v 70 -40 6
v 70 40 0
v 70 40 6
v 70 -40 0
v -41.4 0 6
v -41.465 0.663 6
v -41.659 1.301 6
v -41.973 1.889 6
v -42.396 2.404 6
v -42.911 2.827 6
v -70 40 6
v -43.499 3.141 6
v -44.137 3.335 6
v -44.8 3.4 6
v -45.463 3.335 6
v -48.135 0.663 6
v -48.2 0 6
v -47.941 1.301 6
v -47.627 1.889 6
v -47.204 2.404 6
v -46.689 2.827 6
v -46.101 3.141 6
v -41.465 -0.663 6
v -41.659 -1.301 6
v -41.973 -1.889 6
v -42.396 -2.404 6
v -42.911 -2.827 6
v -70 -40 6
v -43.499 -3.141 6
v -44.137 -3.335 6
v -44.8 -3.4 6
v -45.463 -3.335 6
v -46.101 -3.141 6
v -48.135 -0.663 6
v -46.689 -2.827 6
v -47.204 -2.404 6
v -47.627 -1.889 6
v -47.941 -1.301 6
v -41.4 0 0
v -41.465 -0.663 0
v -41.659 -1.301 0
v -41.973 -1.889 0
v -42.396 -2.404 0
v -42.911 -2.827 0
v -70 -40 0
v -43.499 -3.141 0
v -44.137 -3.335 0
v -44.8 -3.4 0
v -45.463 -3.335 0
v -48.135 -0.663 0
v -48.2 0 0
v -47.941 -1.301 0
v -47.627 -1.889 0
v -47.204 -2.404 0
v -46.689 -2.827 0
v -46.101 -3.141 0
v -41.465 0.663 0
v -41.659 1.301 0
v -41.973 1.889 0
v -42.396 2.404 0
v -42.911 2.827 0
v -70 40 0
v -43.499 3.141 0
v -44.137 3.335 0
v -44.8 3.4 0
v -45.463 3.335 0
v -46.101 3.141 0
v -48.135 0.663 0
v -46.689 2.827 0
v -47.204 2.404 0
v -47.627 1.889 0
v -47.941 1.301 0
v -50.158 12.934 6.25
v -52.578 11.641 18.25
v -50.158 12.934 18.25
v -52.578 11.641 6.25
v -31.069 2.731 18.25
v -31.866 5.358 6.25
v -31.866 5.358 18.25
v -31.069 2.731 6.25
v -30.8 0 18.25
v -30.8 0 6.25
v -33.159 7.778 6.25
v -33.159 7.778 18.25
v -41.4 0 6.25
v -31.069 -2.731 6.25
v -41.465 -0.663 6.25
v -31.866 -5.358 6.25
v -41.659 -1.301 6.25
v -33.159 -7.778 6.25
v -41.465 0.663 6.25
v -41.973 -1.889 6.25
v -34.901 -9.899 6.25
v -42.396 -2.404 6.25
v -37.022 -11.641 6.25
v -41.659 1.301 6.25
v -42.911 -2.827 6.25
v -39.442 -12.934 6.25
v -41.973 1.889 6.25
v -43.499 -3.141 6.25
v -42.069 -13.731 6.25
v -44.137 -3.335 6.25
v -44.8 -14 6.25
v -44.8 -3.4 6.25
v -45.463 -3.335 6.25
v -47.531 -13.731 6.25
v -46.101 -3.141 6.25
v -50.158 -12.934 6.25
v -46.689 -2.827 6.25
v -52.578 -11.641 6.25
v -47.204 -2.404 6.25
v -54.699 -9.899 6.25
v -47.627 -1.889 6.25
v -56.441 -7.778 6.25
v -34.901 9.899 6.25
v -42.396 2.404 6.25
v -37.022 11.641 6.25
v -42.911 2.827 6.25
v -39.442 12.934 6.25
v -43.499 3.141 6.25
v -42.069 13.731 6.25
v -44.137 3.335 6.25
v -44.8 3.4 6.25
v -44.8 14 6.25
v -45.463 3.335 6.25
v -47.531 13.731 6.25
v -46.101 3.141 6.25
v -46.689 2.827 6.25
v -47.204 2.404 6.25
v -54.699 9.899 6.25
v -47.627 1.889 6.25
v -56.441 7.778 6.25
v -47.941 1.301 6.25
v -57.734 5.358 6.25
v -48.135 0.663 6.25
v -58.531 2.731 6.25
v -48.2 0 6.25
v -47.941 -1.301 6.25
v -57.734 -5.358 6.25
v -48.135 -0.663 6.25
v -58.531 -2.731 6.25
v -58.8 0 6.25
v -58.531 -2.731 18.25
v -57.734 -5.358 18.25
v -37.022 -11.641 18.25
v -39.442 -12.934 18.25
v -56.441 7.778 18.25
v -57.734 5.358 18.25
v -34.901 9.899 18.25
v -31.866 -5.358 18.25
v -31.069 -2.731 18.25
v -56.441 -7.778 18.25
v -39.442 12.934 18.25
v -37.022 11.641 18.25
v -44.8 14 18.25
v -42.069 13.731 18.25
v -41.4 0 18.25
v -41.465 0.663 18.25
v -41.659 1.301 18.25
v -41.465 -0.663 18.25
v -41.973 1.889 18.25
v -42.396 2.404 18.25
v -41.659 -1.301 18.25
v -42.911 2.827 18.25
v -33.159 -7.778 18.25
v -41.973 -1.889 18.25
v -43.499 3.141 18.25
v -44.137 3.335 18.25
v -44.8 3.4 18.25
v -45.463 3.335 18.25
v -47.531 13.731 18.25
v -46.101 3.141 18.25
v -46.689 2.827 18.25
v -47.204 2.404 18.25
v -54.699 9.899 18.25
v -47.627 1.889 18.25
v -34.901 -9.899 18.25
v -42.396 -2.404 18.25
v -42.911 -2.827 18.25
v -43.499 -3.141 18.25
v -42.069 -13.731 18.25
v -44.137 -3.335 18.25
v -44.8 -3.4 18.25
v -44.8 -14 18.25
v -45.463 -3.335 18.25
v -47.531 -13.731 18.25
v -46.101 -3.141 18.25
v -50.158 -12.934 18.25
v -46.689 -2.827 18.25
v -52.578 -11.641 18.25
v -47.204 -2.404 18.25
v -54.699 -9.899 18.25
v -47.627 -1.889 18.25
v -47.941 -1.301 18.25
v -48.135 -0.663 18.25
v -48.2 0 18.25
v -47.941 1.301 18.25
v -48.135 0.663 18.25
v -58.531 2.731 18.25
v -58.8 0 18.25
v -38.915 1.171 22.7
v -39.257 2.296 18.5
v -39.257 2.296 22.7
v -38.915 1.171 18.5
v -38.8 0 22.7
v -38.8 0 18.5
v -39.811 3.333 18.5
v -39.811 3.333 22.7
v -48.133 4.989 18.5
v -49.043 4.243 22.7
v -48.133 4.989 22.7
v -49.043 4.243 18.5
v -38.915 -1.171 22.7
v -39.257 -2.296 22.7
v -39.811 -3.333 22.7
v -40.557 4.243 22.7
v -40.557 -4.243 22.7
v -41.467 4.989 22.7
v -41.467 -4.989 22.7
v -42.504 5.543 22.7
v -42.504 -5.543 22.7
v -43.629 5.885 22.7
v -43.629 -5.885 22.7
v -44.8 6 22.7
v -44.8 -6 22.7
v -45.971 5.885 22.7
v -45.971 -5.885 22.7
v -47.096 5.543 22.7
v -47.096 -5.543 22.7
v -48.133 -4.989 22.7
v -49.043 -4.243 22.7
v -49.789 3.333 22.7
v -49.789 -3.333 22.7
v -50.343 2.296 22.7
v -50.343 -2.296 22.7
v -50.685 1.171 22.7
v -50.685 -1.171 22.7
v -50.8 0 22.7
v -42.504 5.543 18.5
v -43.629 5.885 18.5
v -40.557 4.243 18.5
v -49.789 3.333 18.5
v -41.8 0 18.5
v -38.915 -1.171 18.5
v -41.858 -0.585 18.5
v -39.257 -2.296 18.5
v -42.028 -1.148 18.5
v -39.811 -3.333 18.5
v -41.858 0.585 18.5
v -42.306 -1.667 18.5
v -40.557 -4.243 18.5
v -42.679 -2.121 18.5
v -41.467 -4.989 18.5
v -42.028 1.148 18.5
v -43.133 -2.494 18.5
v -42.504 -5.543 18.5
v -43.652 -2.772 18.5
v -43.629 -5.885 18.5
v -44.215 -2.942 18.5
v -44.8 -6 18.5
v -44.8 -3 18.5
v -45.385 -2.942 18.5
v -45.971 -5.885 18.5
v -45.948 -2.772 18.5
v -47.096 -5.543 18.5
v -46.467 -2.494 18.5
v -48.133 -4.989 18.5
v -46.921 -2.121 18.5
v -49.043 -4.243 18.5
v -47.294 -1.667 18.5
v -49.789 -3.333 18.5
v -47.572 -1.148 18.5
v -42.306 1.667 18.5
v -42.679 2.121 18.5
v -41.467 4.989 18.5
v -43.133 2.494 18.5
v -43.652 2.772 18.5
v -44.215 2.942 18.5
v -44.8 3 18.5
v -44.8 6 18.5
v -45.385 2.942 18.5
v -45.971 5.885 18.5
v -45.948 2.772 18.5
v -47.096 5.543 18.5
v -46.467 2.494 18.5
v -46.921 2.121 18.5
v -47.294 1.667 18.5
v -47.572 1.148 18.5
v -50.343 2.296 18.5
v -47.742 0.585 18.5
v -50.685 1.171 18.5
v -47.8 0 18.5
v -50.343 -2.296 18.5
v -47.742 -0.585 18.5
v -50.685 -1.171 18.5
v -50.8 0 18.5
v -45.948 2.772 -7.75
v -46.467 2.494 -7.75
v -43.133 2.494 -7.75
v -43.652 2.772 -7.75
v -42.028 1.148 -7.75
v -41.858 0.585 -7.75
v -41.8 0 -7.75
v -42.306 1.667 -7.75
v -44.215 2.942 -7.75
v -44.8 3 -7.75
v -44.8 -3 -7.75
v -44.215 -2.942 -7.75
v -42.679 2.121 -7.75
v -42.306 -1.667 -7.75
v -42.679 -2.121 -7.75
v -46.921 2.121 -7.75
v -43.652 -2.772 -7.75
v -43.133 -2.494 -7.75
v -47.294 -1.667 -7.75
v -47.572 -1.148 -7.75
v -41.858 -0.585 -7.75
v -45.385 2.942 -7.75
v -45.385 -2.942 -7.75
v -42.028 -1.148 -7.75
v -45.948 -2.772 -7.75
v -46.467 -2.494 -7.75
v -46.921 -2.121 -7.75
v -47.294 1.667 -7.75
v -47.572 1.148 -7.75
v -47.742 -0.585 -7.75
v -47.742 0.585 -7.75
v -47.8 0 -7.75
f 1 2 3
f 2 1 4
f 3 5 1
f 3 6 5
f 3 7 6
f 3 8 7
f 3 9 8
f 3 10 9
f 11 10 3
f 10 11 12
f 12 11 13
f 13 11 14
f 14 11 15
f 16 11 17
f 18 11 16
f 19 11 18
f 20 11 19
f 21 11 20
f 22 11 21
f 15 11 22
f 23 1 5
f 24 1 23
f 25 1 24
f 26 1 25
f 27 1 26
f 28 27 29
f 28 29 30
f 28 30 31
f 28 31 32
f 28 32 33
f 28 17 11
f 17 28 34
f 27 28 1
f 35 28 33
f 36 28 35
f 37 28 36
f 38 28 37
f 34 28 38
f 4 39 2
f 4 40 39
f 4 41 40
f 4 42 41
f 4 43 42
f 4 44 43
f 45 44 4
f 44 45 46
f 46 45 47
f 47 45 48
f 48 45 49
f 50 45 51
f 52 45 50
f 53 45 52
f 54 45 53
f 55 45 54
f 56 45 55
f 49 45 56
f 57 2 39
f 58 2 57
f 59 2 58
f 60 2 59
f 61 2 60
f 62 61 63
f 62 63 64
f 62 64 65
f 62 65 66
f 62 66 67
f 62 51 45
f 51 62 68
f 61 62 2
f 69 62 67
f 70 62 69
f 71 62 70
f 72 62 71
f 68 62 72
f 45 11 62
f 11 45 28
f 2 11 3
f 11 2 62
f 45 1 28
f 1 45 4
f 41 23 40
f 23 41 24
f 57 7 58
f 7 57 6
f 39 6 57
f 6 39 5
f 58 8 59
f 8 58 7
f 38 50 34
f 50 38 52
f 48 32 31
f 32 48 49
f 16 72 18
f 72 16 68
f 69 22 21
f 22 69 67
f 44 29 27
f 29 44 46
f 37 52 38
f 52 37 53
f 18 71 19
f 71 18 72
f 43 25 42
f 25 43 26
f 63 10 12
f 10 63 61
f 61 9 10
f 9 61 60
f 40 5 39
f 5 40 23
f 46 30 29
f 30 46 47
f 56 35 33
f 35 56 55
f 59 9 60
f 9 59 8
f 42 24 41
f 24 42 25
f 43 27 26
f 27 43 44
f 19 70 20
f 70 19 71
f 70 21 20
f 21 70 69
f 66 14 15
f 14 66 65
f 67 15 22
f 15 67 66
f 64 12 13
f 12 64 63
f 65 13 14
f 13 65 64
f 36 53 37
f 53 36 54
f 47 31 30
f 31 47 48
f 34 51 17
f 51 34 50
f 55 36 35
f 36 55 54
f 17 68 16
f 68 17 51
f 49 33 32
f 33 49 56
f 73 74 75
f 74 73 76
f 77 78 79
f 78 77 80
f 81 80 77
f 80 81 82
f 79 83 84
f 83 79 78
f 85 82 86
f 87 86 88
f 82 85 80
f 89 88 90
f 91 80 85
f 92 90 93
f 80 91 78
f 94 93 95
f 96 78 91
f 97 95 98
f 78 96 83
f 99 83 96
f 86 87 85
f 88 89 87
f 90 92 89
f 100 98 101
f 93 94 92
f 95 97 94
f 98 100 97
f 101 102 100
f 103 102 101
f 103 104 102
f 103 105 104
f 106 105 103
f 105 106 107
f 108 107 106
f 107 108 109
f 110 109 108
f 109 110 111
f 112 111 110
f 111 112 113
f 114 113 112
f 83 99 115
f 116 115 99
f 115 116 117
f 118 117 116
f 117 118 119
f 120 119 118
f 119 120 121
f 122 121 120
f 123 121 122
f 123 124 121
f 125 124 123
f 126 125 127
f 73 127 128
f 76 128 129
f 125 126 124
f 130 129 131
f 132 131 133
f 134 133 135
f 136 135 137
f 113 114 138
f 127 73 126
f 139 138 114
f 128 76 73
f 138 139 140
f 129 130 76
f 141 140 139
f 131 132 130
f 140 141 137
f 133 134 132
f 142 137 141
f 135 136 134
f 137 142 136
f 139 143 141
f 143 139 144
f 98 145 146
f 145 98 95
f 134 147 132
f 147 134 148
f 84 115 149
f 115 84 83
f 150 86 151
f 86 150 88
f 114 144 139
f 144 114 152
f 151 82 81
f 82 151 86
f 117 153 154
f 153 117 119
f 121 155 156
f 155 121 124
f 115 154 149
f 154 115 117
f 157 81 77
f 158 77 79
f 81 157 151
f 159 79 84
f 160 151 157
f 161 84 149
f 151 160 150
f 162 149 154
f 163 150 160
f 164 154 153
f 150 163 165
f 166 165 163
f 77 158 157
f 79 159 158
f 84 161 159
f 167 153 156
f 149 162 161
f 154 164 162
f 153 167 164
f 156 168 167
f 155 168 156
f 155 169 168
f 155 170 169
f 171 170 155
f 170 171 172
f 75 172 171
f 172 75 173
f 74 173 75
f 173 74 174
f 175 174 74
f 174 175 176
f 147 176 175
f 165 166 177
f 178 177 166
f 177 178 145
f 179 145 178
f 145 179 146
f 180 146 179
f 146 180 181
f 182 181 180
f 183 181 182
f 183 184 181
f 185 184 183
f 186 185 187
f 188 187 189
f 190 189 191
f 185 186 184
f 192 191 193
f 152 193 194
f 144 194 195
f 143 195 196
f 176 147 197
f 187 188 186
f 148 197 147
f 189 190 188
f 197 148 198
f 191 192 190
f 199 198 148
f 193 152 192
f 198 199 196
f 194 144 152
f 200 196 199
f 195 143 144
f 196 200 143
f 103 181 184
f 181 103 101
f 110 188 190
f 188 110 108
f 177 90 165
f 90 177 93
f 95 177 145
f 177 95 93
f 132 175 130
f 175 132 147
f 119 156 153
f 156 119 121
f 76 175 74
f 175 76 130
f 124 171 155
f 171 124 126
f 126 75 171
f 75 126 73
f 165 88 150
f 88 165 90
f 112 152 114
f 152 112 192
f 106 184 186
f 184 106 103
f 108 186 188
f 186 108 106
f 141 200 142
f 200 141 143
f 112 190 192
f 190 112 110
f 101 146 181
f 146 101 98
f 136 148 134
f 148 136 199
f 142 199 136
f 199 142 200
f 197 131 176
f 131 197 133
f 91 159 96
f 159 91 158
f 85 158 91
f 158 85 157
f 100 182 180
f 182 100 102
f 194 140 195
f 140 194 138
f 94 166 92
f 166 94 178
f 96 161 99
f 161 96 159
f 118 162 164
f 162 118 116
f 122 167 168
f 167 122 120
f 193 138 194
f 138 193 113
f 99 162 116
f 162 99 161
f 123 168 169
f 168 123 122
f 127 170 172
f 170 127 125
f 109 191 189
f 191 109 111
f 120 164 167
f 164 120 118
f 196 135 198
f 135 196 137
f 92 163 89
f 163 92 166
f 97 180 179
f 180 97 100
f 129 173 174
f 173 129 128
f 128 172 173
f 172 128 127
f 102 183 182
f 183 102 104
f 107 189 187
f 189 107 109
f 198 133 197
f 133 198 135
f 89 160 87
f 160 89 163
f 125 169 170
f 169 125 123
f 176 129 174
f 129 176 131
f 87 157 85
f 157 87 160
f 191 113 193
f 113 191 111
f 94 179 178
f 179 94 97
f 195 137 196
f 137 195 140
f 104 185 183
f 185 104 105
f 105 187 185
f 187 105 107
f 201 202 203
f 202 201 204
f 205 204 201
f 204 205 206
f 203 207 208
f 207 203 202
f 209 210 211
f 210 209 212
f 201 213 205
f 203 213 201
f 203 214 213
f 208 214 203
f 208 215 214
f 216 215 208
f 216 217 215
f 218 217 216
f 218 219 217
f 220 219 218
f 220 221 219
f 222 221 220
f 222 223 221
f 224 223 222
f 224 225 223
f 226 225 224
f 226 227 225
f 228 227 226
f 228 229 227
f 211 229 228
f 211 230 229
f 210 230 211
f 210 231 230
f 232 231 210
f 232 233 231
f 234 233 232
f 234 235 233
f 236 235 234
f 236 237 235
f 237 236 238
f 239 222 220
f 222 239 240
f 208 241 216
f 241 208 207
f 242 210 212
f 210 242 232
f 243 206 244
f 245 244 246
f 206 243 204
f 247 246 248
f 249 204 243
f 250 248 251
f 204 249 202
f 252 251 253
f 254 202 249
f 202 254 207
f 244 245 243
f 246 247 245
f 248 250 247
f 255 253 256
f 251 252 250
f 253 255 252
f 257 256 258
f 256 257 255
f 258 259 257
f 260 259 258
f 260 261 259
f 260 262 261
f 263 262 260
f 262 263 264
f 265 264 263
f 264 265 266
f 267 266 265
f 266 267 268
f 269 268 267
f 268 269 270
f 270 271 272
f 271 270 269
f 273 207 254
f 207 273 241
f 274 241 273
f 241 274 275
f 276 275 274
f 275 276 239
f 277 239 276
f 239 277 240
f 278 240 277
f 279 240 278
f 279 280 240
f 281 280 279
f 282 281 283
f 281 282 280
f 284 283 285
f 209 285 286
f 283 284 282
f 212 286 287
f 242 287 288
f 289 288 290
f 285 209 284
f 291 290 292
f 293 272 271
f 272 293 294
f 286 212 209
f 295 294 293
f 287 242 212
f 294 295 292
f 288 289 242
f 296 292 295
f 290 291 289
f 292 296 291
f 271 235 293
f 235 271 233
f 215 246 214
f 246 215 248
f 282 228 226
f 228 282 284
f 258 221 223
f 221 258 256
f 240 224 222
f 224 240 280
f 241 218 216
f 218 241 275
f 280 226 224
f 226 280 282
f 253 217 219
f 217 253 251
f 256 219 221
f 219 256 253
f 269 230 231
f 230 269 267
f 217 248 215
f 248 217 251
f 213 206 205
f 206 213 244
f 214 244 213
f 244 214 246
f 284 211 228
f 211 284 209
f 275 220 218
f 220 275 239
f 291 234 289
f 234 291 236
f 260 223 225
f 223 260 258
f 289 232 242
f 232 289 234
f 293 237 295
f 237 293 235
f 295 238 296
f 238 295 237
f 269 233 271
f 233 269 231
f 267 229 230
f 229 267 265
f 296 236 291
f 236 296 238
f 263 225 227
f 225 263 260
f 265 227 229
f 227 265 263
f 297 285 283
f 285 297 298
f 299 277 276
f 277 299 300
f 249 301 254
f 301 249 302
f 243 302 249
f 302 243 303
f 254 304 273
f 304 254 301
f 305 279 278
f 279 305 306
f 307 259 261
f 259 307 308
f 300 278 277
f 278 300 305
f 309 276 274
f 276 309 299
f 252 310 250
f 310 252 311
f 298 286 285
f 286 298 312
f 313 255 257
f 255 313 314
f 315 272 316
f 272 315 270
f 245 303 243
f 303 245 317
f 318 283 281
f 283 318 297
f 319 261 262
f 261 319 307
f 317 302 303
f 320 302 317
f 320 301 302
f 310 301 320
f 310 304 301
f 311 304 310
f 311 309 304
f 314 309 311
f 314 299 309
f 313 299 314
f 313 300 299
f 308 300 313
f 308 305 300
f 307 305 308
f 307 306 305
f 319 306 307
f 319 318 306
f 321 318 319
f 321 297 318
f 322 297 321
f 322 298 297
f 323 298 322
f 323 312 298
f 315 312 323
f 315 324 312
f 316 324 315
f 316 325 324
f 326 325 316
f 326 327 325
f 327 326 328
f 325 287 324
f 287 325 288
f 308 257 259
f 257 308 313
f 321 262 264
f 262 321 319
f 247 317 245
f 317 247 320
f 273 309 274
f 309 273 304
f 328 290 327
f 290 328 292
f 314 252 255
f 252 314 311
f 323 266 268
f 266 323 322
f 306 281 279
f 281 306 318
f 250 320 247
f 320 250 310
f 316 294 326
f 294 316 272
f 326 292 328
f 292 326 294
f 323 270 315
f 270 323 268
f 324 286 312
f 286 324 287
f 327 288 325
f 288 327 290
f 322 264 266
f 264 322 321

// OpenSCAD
$fn = 32;

// ------------------------------------------------------------------------
// Standoff columns: 1 d28 standoffs, bolts d6
// Every part is its own module, assembly() places them once.
// ------------------------------------------------------------------------

// --- part 1 ---
module base_plate() {
  difference() {
    translate([-70, -40, 0]) cube([140, 80, 6]);
    translate([-44.8, 0, -1]) cylinder(h = 8, d = 6.8);
  }
}

// --- part 2 ---
module spacer() {
  difference() {
      translate([0, 0, 0]) cylinder(h = 12, d = 28);
      translate([0, 0, -1]) cylinder(h = 14, d = 6.8);
    }
}

// --- part 3 ---
module bolt() {
  cylinder(h = 4.2, d = 12);
  translate([0, 0, -26.25]) cylinder(h = 26.25, d = 6);
}

// --- assembly ---
module assembly() {
  translate([0, 0, 0]) rotate([0, 0, 0]) base_plate();
  translate([-44.8, 0, 6.25]) rotate([0, 0, 0]) spacer();
  translate([-44.8, 0, 18.5]) rotate([0, 0, 0]) bolt();
}

assembly();
